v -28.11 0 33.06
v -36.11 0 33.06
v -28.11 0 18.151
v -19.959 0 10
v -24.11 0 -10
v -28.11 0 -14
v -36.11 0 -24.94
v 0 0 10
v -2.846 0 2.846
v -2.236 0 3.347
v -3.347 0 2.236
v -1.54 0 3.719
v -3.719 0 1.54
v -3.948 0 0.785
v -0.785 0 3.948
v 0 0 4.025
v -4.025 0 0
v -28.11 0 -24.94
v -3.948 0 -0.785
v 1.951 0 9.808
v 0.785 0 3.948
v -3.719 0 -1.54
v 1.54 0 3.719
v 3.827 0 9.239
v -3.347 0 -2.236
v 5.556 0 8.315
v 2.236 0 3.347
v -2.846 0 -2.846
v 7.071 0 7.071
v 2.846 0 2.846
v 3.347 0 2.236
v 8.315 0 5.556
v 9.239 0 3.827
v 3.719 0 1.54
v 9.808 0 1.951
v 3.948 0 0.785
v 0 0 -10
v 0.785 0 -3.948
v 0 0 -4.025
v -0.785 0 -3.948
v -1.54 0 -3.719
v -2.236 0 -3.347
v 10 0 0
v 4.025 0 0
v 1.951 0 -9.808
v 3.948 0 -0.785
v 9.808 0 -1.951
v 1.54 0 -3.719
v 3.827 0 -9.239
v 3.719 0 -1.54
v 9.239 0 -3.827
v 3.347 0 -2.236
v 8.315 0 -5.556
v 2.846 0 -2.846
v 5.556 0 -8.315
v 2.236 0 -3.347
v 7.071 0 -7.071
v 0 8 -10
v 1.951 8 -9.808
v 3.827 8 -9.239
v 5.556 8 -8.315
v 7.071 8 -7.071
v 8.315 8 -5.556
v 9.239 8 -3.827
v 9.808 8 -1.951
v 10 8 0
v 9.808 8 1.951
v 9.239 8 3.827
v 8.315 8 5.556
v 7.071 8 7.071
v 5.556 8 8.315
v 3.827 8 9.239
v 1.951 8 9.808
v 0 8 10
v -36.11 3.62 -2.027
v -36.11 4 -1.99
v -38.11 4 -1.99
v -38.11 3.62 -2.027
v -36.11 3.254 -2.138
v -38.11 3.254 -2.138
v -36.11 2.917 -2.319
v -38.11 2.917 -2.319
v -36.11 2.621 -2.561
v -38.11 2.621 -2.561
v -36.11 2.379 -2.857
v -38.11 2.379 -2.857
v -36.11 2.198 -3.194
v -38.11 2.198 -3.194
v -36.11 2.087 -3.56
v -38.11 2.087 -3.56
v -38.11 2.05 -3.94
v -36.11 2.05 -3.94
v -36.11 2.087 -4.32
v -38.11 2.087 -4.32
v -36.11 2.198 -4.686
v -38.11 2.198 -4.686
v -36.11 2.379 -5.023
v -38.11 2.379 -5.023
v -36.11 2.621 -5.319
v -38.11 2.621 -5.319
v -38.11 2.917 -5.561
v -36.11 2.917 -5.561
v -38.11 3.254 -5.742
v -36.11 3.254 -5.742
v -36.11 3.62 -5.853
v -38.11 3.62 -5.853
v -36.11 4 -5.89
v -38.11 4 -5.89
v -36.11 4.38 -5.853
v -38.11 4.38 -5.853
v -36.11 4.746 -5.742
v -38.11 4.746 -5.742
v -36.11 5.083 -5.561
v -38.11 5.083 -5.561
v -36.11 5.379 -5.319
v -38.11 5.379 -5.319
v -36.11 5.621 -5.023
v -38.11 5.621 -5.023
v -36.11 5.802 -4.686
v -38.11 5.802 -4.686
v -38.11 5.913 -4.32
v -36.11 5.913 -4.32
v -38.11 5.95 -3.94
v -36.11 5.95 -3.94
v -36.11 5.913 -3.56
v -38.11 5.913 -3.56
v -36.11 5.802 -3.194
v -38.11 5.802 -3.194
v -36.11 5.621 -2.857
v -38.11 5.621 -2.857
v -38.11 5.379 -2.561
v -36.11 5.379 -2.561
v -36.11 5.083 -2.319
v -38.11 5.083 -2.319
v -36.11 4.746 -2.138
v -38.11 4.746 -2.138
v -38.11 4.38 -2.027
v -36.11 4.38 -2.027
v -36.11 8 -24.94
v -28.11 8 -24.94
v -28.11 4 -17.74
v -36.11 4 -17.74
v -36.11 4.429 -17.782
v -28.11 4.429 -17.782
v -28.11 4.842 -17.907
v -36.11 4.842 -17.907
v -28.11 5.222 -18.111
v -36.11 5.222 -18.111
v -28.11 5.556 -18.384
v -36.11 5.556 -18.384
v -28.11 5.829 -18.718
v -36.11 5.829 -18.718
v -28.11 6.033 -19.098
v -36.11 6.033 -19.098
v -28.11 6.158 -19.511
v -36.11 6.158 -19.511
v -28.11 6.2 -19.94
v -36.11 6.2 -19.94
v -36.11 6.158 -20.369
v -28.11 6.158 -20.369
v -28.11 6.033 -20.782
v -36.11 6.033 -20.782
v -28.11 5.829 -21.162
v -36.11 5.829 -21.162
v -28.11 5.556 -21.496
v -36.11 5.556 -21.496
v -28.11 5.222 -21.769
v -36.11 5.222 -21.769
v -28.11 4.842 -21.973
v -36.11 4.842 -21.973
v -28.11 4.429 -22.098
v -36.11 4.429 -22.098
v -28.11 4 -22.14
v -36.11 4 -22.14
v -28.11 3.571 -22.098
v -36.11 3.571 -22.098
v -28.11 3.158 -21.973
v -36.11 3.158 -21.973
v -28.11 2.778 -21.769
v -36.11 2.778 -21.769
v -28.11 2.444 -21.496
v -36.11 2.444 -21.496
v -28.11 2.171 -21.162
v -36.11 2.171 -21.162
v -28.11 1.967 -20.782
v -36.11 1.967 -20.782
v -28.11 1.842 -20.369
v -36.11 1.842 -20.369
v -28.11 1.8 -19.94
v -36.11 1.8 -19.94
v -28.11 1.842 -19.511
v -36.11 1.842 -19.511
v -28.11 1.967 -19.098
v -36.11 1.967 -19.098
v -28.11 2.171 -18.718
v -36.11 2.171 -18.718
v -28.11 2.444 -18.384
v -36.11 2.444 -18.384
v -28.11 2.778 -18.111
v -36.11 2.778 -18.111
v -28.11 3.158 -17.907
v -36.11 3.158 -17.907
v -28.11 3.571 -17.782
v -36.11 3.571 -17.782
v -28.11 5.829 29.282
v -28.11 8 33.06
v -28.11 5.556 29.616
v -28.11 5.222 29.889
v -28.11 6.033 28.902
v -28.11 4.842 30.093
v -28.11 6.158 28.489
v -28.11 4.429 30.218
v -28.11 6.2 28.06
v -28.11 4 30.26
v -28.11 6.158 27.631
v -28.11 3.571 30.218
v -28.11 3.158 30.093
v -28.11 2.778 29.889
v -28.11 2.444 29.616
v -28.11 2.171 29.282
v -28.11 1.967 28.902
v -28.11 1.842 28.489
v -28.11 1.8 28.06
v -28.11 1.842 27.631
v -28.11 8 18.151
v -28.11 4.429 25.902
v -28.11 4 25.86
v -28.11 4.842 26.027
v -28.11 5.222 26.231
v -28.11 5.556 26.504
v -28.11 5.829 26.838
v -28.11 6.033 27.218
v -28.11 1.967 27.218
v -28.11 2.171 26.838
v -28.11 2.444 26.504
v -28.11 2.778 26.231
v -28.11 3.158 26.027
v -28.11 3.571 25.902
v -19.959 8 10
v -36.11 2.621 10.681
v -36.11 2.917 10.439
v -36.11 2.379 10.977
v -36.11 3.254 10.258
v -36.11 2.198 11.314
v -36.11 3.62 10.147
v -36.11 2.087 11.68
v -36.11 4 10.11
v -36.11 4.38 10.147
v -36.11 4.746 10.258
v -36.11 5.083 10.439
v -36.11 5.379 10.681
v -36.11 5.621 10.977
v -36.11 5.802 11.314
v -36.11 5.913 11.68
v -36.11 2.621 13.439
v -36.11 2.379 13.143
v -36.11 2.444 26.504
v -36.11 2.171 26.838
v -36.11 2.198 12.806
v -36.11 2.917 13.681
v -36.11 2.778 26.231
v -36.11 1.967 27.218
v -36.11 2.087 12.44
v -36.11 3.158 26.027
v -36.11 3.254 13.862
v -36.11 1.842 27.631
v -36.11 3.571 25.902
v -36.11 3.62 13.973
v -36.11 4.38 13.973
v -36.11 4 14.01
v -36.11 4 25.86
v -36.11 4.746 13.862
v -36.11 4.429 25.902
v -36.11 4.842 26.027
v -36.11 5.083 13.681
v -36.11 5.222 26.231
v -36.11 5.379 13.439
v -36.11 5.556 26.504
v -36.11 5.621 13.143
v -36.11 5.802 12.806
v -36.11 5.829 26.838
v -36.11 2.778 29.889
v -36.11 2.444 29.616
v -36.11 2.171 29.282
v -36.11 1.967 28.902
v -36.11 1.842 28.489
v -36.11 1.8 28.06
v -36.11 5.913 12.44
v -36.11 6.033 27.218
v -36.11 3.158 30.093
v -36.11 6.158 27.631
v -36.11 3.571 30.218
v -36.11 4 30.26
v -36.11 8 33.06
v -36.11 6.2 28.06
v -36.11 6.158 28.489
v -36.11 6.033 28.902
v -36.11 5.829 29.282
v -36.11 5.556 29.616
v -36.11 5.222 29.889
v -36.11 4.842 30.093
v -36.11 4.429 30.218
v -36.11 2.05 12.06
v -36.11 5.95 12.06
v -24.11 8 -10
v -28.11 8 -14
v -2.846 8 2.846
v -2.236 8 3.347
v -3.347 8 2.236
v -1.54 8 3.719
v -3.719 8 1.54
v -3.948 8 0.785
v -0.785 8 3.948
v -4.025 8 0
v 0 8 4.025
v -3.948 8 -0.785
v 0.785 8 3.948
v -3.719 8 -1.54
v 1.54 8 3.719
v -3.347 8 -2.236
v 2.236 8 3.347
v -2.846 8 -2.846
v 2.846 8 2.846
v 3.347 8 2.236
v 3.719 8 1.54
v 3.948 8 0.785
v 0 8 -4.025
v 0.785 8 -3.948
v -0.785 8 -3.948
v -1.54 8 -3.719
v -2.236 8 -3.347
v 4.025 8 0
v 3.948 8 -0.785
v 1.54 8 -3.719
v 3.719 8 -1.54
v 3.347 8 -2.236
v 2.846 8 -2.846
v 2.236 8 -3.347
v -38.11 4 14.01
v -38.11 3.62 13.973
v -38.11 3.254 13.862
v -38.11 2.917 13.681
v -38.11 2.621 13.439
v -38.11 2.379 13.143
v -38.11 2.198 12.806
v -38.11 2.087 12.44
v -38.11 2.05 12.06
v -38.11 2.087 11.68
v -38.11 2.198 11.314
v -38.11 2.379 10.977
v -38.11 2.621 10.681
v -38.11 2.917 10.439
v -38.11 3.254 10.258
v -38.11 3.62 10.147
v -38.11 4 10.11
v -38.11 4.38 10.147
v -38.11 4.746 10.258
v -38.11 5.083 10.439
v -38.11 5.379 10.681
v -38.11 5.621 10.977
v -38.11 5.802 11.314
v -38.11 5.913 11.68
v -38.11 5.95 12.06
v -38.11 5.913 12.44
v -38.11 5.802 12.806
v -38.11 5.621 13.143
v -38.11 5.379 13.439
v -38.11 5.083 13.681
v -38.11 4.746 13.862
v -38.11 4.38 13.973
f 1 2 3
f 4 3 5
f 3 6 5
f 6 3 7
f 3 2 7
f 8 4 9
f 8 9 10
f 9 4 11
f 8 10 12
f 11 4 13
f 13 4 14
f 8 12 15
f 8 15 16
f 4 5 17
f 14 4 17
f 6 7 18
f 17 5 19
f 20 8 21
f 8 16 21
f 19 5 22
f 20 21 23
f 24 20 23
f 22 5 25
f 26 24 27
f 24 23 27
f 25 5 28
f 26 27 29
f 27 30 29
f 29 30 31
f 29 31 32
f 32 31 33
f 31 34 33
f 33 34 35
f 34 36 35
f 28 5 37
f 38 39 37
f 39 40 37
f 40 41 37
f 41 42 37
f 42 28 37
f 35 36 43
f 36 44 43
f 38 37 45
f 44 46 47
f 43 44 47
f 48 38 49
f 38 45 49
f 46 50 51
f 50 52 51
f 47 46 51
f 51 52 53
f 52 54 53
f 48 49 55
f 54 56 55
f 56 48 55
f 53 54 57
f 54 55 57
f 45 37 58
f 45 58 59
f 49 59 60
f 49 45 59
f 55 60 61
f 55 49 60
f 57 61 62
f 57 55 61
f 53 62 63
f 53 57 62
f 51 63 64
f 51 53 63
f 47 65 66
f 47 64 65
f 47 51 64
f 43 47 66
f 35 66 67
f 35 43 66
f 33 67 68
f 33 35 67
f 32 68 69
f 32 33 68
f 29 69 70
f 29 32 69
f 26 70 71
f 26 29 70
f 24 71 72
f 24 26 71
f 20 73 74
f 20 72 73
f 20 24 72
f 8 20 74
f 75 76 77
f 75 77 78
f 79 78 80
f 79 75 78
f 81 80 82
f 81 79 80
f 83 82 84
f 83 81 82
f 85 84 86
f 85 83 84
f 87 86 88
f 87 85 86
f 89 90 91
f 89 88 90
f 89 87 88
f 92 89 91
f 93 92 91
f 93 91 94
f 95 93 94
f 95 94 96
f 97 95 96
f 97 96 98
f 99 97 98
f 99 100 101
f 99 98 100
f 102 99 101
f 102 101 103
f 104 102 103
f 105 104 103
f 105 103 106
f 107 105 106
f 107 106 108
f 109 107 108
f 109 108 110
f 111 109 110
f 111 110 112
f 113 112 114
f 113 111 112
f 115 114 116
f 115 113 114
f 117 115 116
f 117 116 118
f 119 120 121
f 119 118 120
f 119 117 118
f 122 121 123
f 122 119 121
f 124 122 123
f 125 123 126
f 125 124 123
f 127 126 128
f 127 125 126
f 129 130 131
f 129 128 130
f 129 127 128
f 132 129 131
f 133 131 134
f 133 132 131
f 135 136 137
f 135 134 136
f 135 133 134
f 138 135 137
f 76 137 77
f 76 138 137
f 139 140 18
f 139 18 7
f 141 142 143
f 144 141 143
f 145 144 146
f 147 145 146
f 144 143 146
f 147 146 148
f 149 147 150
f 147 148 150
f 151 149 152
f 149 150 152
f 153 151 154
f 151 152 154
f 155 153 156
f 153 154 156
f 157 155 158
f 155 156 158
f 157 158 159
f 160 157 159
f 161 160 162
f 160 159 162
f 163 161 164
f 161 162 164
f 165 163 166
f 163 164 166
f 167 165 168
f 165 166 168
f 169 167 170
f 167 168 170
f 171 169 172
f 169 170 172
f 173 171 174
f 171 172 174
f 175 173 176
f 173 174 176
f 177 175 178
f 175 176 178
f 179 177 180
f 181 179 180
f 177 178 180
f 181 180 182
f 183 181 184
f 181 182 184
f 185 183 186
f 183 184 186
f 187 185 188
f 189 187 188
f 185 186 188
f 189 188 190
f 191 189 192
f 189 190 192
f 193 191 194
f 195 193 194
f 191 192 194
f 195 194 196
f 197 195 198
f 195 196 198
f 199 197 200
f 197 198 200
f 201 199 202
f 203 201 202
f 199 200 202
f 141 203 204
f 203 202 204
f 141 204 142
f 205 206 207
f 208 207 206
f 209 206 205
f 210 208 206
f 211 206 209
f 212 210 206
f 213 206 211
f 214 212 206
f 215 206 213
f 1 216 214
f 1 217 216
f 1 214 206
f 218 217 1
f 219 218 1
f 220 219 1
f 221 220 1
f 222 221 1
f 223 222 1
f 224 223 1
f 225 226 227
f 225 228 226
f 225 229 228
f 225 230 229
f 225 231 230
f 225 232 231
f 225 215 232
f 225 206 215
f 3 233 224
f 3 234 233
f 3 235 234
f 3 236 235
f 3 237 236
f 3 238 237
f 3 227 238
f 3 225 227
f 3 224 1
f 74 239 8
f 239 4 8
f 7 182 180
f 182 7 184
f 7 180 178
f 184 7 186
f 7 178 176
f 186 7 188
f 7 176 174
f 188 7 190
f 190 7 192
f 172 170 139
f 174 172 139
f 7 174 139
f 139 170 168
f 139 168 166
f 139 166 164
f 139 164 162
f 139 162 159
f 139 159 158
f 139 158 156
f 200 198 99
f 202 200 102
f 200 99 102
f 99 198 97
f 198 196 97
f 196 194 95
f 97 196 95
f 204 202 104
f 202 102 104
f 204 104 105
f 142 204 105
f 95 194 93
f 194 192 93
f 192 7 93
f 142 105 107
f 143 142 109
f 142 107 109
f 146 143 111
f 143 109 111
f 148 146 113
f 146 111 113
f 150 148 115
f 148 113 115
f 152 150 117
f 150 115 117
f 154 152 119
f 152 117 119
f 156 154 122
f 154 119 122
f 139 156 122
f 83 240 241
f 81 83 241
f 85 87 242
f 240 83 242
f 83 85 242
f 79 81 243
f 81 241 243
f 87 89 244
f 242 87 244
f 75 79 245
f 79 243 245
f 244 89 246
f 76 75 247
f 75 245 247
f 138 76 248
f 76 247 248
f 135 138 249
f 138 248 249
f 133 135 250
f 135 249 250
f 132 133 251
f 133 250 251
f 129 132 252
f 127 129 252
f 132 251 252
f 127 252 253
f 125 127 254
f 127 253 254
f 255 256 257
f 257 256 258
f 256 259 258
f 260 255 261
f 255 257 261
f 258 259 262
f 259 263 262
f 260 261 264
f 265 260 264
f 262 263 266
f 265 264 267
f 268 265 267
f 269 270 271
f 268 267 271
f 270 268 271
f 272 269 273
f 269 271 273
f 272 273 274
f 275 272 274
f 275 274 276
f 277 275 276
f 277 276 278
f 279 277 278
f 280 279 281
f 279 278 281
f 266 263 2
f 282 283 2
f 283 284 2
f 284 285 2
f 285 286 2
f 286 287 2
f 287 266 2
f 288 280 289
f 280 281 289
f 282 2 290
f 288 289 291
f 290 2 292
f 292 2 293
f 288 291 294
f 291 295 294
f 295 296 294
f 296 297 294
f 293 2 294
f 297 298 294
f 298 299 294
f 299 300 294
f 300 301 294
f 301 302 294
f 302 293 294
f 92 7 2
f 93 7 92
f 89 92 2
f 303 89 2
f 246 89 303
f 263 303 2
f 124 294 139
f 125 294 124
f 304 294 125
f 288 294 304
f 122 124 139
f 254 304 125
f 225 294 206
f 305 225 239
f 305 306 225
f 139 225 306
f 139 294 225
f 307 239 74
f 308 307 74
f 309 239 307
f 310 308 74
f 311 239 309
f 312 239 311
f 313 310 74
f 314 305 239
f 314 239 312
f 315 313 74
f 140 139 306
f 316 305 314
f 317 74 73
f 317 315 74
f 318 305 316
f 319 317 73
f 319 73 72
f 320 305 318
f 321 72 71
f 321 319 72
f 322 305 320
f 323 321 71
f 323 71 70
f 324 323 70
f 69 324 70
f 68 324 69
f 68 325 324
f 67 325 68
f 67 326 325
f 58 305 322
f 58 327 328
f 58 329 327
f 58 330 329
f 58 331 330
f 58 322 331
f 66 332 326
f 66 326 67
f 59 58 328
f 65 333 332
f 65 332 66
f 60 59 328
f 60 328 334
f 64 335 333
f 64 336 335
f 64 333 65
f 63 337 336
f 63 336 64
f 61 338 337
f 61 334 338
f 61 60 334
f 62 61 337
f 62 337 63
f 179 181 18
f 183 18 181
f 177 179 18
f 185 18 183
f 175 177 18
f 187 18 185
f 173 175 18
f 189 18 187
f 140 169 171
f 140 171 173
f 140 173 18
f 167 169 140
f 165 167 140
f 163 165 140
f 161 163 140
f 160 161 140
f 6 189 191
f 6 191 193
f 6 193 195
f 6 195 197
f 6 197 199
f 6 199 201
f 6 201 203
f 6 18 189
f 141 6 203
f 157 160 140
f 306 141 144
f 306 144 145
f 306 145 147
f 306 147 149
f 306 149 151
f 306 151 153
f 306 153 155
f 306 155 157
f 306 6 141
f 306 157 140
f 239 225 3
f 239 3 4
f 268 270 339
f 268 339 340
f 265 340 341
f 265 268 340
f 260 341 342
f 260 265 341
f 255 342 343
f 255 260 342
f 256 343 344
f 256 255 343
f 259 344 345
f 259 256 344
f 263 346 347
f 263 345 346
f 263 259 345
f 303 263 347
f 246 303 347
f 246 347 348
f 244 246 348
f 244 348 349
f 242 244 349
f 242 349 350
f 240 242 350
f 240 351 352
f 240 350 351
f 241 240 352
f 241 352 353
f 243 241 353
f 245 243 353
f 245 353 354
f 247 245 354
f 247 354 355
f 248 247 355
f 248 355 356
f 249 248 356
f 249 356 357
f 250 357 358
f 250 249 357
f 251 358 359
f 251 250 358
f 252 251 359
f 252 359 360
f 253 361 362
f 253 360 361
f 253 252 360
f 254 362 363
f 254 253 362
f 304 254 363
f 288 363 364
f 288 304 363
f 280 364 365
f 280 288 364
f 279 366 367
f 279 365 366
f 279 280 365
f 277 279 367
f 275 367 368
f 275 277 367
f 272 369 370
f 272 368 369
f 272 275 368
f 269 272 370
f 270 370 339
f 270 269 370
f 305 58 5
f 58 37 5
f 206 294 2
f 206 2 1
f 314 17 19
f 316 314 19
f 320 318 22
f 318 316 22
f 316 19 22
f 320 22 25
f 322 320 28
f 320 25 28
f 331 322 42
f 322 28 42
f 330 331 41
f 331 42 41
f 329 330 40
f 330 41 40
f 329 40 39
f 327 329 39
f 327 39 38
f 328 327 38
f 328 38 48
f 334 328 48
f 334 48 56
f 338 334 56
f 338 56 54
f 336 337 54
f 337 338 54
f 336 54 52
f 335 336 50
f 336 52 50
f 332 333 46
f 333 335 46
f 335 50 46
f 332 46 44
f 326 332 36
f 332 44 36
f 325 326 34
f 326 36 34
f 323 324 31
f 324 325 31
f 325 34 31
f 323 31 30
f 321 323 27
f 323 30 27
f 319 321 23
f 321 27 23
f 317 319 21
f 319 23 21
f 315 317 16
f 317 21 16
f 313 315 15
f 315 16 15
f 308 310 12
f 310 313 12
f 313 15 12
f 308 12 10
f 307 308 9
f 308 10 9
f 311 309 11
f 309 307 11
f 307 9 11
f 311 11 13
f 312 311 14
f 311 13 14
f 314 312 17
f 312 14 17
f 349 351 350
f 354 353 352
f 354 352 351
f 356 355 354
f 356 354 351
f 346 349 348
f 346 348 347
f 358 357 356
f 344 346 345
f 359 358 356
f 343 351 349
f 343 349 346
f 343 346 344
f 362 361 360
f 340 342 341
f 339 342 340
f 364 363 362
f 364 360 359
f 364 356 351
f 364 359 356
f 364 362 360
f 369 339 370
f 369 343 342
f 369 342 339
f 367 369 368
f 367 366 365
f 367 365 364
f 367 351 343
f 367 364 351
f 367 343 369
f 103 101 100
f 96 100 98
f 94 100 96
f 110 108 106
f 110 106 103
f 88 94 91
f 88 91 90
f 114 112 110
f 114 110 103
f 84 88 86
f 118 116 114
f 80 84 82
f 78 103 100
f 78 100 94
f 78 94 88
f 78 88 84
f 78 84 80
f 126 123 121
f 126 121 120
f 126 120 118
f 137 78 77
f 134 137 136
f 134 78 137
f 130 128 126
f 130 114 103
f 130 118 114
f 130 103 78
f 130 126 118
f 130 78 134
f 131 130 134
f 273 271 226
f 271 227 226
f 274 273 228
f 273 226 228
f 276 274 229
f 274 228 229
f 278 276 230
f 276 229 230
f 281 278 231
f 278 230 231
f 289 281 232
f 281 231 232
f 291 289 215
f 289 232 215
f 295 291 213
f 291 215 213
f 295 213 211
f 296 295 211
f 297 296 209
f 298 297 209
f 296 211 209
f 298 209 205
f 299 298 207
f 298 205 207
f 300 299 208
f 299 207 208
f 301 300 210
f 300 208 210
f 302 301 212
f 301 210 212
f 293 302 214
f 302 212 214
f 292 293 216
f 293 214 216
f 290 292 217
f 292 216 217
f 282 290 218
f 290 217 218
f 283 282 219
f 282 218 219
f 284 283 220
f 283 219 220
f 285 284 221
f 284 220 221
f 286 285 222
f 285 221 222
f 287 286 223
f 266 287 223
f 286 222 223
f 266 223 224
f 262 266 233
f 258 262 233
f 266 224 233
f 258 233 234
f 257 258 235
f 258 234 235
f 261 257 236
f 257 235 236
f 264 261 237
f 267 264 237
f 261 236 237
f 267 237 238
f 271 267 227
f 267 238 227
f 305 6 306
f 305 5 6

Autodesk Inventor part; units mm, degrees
ref_plane "YZ Plane" through (0, 0, 0) normal (1, 0, 0) x (0, 1, 0)
ref_plane "XZ Plane" through (0, 0, 0) normal (0, 1, 0) x (-1, 0, 0)
ref_plane "XY Plane" through (0, 0, 0) normal (0, 0, 1) x (1, 0, 0)
sketch "Sketch1" plane through (0, 0, 0) normal (0, 1, 0) x (-1, 0, 0)
  circle A0 centre (0, 0) radius 4.025
  line L0 (0, 0) -> (36.11, 0) construction
  line L1 (0, -10) -> (36.11, -10)
  line L2 (36.11, 10) -> (0, 10)
  arc A1 (0, 10) -> (0, -10) centre (0, 0) ccw
  line L3 (36.11, 10) -> (36.11, -10)
  point P0 (18.055, 0)
  dimension "d0" = 8.05
  dimension "d1" = 36.11
extrude "Extrusion1" add sketch "Sketch1" along normal blind 8
sketch "Sketch2" plane through (-36.11, 0, 10) normal (0, 0, 1) x (1, 0, 0)
  line L0 (0, 0) -> (0, 8) projected
  line L1 (36.11, 0) -> (0, 0) projected
  line L2 (0, 8) -> (8, 8)
  line L3 (8, 8) -> (8, 0)
  line L4 (8, 0) -> (0, 0)
  line L5 (0, 0) -> (0, 8)
  dimension "d5" = 8
extrude "Extrusion2" add sketch "Sketch2" along normal blind 23.06
sketch "Sketch3" plane through (-28.11, 0, 10) normal (1, 0, 0) x (0, 0, -1)
  circle A0 centre (-18.06, 4) radius 2.2
  line L0 (-23.06, 0) -> (-23.06, 8) projected
  point P0 (10, 0)
  point P1 (-23.06, 4)
  dimension "d8" = 4.4
  dimension "d9" = 5
extrude "Extrusion3" cut sketch "Sketch3" against normal blind 23.06
sketch "Sketch4" plane through (0, 0, -10) normal (0, 0, -1) x (-1, 0, 0)
  line L0 (36.11, 0) -> (36.11, 8) projected
  line L1 (28.11, 0) -> (28.11, 8) projected
  line L2 (36.11, 8) -> (28.11, 8)
  line L3 (28.11, 8) -> (28.11, 0)
  line L4 (28.11, 0) -> (36.11, 0)
  line L5 (36.11, 0) -> (36.11, 8)
  point P0 (0, 0)
extrude "Extrusion4" add sketch "Sketch4" along normal blind 14.94
sketch "Sketch6" plane through (-36.11, 0, 33.06) normal (-1, 0, 0) x (0, 0, 1)
  circle A0 centre (-21, 4) radius 1.95
  circle A1 centre (-5, 4) radius 2.2 projected
  circle A2 centre (-37, 4) radius 1.95
  circle A3 centre (-53, 4) radius 2.2
  point P0 (-33.06, 0)
  dimension "d18" = 3.9
  dimension "d19" = 16
  dimension "d20" = 3.9
  dimension "d21" = 16
  dimension "d22" = 4.4
  dimension "d23" = 16
extrude "Extrusion6" add sketch "Sketch6" along normal blind 2 contours A0 | A2
extrude "Extrusion7" cut sketch "Sketch6" against normal blind 13 contours A3
sketch "Sketch7" plane through (0, 8, 0) normal (0, 1, 0) x (1, 0, 0)
  point P0 (0, 0)
sketch "Sketch8" plane through (0, 8, 0) normal (0, 1, 0) x (1, 0, 0)
  line L0 (-28.11, -10) -> (-28.11, -33.06) construction
  line L1 (-28.11, -28.0914) -> (-28.11, -18.1514)
  line L2 (-28.11, -18.1514) -> (-19.9586, -10)
  line L3 (-28.11, -10) -> (0, -10) projected
  line L4 (-28.11, -18.1514) -> (-16.5822, -18.1514) construction
  line L5 (-19.9586, -10) -> (-28.11, -10)
  line L6 (-28.11, -10) -> (-28.11, -18.1514)
  point P0 (0, 0)
  dimension "d31" = 9.94
  dimension "d32" = 45
extrude "Extrusion8" add sketch "Sketch8" against normal blind 8
chamfer "Chamfer1" distance 4 angle 45 1 edges at (-28.11, 4, -10)
properties part number "Launcher_support"
